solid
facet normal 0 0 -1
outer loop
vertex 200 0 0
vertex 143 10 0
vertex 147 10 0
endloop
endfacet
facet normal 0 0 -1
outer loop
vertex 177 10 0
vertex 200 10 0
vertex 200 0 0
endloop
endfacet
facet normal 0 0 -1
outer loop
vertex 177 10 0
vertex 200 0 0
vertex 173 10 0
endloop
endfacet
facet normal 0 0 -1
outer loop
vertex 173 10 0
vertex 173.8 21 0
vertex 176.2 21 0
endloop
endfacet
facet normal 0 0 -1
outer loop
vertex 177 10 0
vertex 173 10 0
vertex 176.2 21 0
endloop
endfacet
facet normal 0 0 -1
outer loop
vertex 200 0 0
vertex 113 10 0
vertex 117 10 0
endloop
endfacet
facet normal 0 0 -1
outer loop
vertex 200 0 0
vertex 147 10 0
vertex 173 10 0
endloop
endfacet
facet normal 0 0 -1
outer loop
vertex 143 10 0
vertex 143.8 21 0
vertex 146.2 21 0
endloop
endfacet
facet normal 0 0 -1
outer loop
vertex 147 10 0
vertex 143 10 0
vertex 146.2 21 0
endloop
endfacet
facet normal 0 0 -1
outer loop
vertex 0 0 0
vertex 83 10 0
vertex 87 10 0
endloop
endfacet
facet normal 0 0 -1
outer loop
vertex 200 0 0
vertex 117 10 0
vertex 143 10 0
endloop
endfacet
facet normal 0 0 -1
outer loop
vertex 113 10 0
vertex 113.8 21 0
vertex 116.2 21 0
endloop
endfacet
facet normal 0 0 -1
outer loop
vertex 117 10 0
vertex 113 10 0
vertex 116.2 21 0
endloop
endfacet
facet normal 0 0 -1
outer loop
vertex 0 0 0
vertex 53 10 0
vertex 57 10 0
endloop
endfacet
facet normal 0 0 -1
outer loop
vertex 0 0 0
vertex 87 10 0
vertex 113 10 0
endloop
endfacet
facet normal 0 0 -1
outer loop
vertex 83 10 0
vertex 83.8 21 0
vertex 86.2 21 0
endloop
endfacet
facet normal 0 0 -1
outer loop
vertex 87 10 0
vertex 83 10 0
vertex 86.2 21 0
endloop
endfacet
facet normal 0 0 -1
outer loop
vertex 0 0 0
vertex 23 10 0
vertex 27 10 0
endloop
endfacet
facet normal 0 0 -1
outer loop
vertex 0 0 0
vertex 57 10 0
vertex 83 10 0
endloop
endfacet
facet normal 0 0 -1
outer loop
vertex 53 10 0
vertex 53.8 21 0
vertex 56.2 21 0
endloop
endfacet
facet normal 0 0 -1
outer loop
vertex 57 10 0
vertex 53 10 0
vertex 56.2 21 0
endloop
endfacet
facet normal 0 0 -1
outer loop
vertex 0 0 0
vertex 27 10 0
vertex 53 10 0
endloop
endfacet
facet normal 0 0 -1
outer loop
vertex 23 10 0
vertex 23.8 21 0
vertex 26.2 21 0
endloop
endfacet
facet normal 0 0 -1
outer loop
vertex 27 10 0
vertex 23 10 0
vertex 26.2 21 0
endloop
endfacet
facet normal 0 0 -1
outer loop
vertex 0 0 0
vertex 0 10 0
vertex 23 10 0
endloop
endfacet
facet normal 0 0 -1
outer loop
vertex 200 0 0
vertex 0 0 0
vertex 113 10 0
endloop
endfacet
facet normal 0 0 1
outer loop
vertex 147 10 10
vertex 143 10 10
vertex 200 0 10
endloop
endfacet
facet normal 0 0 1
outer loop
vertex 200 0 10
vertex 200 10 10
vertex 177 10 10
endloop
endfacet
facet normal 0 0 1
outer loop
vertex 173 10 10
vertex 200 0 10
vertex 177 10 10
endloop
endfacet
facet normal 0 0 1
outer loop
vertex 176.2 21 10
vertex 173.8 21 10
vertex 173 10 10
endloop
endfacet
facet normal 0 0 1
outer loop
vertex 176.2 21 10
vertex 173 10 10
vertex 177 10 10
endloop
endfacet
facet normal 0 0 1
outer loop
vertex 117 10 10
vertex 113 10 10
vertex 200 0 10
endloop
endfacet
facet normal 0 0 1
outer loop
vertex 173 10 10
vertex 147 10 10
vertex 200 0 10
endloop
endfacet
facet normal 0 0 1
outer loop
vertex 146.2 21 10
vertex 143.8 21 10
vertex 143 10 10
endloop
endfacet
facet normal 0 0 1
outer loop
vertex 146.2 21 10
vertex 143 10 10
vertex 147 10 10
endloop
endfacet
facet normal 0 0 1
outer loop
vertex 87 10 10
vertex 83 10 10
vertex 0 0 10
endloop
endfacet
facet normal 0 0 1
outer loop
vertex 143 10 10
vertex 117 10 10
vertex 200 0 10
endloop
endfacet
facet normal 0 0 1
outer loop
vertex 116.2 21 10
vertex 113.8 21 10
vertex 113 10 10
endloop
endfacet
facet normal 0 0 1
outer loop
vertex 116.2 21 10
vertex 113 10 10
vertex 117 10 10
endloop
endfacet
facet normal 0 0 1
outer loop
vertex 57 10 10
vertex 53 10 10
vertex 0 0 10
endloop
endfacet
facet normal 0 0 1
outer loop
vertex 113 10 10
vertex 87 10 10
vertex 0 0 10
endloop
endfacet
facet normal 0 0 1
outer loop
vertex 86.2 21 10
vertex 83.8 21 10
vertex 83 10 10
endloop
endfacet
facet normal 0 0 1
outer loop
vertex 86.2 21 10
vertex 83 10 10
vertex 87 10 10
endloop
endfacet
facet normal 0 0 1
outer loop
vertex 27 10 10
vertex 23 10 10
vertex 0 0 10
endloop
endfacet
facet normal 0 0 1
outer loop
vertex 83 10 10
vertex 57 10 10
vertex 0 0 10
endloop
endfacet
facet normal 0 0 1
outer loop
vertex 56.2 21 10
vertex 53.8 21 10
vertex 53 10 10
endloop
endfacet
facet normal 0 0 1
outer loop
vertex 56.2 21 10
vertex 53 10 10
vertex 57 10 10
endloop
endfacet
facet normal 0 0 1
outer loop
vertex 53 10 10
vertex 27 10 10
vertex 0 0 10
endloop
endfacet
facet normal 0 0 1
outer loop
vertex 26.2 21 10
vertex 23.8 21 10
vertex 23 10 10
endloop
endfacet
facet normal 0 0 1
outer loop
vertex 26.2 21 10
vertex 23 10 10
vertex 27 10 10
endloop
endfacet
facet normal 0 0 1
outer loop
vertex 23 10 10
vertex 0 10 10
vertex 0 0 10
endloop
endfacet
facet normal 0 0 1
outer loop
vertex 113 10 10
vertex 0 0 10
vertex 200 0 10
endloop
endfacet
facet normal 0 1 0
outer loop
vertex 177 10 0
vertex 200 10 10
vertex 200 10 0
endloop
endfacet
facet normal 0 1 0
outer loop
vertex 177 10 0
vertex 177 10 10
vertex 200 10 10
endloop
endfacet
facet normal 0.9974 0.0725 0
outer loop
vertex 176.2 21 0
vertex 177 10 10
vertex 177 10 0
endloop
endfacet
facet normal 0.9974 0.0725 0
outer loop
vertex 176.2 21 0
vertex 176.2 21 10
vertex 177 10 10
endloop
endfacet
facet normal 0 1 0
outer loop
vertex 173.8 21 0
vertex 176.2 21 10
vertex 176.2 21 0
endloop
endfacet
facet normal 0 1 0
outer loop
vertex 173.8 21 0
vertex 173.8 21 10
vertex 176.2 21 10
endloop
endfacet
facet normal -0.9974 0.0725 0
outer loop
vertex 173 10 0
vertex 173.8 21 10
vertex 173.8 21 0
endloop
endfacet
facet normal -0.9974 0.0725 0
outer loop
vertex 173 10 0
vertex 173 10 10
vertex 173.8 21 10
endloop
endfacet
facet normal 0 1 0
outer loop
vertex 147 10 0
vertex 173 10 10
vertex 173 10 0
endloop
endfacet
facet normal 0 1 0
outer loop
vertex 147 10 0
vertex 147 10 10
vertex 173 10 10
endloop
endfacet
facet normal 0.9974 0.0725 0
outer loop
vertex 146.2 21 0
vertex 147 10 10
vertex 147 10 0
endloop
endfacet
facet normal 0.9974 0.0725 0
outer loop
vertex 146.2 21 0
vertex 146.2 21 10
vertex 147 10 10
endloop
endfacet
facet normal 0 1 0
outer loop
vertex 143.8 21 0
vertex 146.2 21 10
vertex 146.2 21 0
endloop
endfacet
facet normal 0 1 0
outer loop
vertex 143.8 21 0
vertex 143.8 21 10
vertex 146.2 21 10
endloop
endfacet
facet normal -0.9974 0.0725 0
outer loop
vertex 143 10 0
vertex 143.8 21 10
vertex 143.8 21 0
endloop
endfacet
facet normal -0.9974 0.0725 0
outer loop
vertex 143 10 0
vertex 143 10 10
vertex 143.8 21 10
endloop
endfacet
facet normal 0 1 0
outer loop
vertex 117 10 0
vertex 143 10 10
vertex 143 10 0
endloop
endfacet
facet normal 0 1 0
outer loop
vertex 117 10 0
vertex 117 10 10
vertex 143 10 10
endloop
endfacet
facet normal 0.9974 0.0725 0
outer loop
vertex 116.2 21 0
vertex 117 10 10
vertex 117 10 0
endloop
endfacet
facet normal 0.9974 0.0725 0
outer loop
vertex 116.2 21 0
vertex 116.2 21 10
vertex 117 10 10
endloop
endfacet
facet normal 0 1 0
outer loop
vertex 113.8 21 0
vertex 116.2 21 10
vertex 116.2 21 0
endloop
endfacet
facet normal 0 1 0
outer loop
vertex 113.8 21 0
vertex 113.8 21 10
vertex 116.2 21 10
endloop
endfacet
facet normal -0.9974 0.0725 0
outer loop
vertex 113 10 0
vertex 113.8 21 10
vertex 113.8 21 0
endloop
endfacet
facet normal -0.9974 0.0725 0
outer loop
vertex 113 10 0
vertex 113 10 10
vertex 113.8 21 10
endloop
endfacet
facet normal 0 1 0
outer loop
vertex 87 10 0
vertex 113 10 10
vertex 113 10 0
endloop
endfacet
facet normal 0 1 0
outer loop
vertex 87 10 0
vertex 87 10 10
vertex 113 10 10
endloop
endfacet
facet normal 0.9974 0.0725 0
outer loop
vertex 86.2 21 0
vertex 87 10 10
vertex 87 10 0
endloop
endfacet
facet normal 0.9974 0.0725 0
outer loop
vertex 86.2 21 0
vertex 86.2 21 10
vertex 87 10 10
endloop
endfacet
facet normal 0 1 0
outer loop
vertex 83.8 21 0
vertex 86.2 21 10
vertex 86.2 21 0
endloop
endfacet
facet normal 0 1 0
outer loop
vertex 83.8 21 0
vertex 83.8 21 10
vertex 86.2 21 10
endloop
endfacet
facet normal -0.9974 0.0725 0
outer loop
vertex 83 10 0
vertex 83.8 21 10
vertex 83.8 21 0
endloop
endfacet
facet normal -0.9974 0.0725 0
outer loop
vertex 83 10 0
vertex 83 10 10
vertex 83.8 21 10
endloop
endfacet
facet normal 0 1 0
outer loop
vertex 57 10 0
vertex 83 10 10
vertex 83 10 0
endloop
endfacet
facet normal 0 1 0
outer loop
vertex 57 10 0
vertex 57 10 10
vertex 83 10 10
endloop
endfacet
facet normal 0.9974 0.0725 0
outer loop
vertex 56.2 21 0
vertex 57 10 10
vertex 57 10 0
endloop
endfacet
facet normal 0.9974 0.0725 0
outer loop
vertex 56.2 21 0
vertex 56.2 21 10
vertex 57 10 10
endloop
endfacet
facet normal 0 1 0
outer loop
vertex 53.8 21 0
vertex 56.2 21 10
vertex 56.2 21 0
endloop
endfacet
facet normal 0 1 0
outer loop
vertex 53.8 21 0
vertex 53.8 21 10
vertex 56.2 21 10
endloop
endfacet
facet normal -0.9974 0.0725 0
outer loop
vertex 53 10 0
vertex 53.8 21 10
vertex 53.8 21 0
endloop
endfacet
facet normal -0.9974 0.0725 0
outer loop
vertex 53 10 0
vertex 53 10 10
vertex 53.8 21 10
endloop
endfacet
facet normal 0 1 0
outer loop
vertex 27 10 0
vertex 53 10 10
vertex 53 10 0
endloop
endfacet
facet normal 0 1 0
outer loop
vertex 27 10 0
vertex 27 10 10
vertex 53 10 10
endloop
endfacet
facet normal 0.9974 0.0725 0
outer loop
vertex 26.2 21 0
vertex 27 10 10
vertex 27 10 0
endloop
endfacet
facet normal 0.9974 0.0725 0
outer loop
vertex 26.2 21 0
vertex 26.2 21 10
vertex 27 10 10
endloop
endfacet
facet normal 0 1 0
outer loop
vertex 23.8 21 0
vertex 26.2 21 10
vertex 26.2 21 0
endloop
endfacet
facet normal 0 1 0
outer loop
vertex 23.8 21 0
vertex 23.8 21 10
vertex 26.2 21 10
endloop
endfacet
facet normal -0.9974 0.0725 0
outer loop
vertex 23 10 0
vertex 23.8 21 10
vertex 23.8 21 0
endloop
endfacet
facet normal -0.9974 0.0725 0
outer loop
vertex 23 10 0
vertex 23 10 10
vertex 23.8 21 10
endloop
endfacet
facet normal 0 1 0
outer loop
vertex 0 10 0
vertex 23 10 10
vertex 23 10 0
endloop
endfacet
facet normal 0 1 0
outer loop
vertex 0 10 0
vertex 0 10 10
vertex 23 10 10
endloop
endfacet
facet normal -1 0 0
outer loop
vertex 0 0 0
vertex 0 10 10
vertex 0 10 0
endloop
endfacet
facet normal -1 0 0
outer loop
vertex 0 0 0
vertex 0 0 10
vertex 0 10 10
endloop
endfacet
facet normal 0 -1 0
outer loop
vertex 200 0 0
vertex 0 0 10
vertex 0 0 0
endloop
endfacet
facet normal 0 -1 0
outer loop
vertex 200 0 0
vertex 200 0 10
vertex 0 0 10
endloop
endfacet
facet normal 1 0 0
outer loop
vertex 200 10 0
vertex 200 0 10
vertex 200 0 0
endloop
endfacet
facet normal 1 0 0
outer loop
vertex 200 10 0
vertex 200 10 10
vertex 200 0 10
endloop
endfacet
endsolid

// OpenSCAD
$fn = 32;

// ----------------------------------------------------------------------
// Gear rack: 6 teeth on a 200 mm bar, pitch 30 mm
// ----------------------------------------------------------------------

// --- parameters (mm) ---
profile_height = 10;      // extrusion height
profile_points = 28;      // points of the closed outline

profile = [[0, 0], [200, 0], [200, 10], [177, 10], [176.2, 21], [173.8, 21], [173, 10], [147, 10], [146.2, 21], [143.8, 21], [143, 10], [117, 10], [116.2, 21], [113.8, 21], [113, 10], [87, 10], [86.2, 21], [83.8, 21], [83, 10], [57, 10], [56.2, 21], [53.8, 21], [53, 10], [27, 10], [26.2, 21], [23.8, 21], [23, 10], [0, 10]];  // single closed polygon, 28 points, counter clockwise

// --- the one profile operation ---
linear_extrude(height = profile_height) polygon(points = profile);
